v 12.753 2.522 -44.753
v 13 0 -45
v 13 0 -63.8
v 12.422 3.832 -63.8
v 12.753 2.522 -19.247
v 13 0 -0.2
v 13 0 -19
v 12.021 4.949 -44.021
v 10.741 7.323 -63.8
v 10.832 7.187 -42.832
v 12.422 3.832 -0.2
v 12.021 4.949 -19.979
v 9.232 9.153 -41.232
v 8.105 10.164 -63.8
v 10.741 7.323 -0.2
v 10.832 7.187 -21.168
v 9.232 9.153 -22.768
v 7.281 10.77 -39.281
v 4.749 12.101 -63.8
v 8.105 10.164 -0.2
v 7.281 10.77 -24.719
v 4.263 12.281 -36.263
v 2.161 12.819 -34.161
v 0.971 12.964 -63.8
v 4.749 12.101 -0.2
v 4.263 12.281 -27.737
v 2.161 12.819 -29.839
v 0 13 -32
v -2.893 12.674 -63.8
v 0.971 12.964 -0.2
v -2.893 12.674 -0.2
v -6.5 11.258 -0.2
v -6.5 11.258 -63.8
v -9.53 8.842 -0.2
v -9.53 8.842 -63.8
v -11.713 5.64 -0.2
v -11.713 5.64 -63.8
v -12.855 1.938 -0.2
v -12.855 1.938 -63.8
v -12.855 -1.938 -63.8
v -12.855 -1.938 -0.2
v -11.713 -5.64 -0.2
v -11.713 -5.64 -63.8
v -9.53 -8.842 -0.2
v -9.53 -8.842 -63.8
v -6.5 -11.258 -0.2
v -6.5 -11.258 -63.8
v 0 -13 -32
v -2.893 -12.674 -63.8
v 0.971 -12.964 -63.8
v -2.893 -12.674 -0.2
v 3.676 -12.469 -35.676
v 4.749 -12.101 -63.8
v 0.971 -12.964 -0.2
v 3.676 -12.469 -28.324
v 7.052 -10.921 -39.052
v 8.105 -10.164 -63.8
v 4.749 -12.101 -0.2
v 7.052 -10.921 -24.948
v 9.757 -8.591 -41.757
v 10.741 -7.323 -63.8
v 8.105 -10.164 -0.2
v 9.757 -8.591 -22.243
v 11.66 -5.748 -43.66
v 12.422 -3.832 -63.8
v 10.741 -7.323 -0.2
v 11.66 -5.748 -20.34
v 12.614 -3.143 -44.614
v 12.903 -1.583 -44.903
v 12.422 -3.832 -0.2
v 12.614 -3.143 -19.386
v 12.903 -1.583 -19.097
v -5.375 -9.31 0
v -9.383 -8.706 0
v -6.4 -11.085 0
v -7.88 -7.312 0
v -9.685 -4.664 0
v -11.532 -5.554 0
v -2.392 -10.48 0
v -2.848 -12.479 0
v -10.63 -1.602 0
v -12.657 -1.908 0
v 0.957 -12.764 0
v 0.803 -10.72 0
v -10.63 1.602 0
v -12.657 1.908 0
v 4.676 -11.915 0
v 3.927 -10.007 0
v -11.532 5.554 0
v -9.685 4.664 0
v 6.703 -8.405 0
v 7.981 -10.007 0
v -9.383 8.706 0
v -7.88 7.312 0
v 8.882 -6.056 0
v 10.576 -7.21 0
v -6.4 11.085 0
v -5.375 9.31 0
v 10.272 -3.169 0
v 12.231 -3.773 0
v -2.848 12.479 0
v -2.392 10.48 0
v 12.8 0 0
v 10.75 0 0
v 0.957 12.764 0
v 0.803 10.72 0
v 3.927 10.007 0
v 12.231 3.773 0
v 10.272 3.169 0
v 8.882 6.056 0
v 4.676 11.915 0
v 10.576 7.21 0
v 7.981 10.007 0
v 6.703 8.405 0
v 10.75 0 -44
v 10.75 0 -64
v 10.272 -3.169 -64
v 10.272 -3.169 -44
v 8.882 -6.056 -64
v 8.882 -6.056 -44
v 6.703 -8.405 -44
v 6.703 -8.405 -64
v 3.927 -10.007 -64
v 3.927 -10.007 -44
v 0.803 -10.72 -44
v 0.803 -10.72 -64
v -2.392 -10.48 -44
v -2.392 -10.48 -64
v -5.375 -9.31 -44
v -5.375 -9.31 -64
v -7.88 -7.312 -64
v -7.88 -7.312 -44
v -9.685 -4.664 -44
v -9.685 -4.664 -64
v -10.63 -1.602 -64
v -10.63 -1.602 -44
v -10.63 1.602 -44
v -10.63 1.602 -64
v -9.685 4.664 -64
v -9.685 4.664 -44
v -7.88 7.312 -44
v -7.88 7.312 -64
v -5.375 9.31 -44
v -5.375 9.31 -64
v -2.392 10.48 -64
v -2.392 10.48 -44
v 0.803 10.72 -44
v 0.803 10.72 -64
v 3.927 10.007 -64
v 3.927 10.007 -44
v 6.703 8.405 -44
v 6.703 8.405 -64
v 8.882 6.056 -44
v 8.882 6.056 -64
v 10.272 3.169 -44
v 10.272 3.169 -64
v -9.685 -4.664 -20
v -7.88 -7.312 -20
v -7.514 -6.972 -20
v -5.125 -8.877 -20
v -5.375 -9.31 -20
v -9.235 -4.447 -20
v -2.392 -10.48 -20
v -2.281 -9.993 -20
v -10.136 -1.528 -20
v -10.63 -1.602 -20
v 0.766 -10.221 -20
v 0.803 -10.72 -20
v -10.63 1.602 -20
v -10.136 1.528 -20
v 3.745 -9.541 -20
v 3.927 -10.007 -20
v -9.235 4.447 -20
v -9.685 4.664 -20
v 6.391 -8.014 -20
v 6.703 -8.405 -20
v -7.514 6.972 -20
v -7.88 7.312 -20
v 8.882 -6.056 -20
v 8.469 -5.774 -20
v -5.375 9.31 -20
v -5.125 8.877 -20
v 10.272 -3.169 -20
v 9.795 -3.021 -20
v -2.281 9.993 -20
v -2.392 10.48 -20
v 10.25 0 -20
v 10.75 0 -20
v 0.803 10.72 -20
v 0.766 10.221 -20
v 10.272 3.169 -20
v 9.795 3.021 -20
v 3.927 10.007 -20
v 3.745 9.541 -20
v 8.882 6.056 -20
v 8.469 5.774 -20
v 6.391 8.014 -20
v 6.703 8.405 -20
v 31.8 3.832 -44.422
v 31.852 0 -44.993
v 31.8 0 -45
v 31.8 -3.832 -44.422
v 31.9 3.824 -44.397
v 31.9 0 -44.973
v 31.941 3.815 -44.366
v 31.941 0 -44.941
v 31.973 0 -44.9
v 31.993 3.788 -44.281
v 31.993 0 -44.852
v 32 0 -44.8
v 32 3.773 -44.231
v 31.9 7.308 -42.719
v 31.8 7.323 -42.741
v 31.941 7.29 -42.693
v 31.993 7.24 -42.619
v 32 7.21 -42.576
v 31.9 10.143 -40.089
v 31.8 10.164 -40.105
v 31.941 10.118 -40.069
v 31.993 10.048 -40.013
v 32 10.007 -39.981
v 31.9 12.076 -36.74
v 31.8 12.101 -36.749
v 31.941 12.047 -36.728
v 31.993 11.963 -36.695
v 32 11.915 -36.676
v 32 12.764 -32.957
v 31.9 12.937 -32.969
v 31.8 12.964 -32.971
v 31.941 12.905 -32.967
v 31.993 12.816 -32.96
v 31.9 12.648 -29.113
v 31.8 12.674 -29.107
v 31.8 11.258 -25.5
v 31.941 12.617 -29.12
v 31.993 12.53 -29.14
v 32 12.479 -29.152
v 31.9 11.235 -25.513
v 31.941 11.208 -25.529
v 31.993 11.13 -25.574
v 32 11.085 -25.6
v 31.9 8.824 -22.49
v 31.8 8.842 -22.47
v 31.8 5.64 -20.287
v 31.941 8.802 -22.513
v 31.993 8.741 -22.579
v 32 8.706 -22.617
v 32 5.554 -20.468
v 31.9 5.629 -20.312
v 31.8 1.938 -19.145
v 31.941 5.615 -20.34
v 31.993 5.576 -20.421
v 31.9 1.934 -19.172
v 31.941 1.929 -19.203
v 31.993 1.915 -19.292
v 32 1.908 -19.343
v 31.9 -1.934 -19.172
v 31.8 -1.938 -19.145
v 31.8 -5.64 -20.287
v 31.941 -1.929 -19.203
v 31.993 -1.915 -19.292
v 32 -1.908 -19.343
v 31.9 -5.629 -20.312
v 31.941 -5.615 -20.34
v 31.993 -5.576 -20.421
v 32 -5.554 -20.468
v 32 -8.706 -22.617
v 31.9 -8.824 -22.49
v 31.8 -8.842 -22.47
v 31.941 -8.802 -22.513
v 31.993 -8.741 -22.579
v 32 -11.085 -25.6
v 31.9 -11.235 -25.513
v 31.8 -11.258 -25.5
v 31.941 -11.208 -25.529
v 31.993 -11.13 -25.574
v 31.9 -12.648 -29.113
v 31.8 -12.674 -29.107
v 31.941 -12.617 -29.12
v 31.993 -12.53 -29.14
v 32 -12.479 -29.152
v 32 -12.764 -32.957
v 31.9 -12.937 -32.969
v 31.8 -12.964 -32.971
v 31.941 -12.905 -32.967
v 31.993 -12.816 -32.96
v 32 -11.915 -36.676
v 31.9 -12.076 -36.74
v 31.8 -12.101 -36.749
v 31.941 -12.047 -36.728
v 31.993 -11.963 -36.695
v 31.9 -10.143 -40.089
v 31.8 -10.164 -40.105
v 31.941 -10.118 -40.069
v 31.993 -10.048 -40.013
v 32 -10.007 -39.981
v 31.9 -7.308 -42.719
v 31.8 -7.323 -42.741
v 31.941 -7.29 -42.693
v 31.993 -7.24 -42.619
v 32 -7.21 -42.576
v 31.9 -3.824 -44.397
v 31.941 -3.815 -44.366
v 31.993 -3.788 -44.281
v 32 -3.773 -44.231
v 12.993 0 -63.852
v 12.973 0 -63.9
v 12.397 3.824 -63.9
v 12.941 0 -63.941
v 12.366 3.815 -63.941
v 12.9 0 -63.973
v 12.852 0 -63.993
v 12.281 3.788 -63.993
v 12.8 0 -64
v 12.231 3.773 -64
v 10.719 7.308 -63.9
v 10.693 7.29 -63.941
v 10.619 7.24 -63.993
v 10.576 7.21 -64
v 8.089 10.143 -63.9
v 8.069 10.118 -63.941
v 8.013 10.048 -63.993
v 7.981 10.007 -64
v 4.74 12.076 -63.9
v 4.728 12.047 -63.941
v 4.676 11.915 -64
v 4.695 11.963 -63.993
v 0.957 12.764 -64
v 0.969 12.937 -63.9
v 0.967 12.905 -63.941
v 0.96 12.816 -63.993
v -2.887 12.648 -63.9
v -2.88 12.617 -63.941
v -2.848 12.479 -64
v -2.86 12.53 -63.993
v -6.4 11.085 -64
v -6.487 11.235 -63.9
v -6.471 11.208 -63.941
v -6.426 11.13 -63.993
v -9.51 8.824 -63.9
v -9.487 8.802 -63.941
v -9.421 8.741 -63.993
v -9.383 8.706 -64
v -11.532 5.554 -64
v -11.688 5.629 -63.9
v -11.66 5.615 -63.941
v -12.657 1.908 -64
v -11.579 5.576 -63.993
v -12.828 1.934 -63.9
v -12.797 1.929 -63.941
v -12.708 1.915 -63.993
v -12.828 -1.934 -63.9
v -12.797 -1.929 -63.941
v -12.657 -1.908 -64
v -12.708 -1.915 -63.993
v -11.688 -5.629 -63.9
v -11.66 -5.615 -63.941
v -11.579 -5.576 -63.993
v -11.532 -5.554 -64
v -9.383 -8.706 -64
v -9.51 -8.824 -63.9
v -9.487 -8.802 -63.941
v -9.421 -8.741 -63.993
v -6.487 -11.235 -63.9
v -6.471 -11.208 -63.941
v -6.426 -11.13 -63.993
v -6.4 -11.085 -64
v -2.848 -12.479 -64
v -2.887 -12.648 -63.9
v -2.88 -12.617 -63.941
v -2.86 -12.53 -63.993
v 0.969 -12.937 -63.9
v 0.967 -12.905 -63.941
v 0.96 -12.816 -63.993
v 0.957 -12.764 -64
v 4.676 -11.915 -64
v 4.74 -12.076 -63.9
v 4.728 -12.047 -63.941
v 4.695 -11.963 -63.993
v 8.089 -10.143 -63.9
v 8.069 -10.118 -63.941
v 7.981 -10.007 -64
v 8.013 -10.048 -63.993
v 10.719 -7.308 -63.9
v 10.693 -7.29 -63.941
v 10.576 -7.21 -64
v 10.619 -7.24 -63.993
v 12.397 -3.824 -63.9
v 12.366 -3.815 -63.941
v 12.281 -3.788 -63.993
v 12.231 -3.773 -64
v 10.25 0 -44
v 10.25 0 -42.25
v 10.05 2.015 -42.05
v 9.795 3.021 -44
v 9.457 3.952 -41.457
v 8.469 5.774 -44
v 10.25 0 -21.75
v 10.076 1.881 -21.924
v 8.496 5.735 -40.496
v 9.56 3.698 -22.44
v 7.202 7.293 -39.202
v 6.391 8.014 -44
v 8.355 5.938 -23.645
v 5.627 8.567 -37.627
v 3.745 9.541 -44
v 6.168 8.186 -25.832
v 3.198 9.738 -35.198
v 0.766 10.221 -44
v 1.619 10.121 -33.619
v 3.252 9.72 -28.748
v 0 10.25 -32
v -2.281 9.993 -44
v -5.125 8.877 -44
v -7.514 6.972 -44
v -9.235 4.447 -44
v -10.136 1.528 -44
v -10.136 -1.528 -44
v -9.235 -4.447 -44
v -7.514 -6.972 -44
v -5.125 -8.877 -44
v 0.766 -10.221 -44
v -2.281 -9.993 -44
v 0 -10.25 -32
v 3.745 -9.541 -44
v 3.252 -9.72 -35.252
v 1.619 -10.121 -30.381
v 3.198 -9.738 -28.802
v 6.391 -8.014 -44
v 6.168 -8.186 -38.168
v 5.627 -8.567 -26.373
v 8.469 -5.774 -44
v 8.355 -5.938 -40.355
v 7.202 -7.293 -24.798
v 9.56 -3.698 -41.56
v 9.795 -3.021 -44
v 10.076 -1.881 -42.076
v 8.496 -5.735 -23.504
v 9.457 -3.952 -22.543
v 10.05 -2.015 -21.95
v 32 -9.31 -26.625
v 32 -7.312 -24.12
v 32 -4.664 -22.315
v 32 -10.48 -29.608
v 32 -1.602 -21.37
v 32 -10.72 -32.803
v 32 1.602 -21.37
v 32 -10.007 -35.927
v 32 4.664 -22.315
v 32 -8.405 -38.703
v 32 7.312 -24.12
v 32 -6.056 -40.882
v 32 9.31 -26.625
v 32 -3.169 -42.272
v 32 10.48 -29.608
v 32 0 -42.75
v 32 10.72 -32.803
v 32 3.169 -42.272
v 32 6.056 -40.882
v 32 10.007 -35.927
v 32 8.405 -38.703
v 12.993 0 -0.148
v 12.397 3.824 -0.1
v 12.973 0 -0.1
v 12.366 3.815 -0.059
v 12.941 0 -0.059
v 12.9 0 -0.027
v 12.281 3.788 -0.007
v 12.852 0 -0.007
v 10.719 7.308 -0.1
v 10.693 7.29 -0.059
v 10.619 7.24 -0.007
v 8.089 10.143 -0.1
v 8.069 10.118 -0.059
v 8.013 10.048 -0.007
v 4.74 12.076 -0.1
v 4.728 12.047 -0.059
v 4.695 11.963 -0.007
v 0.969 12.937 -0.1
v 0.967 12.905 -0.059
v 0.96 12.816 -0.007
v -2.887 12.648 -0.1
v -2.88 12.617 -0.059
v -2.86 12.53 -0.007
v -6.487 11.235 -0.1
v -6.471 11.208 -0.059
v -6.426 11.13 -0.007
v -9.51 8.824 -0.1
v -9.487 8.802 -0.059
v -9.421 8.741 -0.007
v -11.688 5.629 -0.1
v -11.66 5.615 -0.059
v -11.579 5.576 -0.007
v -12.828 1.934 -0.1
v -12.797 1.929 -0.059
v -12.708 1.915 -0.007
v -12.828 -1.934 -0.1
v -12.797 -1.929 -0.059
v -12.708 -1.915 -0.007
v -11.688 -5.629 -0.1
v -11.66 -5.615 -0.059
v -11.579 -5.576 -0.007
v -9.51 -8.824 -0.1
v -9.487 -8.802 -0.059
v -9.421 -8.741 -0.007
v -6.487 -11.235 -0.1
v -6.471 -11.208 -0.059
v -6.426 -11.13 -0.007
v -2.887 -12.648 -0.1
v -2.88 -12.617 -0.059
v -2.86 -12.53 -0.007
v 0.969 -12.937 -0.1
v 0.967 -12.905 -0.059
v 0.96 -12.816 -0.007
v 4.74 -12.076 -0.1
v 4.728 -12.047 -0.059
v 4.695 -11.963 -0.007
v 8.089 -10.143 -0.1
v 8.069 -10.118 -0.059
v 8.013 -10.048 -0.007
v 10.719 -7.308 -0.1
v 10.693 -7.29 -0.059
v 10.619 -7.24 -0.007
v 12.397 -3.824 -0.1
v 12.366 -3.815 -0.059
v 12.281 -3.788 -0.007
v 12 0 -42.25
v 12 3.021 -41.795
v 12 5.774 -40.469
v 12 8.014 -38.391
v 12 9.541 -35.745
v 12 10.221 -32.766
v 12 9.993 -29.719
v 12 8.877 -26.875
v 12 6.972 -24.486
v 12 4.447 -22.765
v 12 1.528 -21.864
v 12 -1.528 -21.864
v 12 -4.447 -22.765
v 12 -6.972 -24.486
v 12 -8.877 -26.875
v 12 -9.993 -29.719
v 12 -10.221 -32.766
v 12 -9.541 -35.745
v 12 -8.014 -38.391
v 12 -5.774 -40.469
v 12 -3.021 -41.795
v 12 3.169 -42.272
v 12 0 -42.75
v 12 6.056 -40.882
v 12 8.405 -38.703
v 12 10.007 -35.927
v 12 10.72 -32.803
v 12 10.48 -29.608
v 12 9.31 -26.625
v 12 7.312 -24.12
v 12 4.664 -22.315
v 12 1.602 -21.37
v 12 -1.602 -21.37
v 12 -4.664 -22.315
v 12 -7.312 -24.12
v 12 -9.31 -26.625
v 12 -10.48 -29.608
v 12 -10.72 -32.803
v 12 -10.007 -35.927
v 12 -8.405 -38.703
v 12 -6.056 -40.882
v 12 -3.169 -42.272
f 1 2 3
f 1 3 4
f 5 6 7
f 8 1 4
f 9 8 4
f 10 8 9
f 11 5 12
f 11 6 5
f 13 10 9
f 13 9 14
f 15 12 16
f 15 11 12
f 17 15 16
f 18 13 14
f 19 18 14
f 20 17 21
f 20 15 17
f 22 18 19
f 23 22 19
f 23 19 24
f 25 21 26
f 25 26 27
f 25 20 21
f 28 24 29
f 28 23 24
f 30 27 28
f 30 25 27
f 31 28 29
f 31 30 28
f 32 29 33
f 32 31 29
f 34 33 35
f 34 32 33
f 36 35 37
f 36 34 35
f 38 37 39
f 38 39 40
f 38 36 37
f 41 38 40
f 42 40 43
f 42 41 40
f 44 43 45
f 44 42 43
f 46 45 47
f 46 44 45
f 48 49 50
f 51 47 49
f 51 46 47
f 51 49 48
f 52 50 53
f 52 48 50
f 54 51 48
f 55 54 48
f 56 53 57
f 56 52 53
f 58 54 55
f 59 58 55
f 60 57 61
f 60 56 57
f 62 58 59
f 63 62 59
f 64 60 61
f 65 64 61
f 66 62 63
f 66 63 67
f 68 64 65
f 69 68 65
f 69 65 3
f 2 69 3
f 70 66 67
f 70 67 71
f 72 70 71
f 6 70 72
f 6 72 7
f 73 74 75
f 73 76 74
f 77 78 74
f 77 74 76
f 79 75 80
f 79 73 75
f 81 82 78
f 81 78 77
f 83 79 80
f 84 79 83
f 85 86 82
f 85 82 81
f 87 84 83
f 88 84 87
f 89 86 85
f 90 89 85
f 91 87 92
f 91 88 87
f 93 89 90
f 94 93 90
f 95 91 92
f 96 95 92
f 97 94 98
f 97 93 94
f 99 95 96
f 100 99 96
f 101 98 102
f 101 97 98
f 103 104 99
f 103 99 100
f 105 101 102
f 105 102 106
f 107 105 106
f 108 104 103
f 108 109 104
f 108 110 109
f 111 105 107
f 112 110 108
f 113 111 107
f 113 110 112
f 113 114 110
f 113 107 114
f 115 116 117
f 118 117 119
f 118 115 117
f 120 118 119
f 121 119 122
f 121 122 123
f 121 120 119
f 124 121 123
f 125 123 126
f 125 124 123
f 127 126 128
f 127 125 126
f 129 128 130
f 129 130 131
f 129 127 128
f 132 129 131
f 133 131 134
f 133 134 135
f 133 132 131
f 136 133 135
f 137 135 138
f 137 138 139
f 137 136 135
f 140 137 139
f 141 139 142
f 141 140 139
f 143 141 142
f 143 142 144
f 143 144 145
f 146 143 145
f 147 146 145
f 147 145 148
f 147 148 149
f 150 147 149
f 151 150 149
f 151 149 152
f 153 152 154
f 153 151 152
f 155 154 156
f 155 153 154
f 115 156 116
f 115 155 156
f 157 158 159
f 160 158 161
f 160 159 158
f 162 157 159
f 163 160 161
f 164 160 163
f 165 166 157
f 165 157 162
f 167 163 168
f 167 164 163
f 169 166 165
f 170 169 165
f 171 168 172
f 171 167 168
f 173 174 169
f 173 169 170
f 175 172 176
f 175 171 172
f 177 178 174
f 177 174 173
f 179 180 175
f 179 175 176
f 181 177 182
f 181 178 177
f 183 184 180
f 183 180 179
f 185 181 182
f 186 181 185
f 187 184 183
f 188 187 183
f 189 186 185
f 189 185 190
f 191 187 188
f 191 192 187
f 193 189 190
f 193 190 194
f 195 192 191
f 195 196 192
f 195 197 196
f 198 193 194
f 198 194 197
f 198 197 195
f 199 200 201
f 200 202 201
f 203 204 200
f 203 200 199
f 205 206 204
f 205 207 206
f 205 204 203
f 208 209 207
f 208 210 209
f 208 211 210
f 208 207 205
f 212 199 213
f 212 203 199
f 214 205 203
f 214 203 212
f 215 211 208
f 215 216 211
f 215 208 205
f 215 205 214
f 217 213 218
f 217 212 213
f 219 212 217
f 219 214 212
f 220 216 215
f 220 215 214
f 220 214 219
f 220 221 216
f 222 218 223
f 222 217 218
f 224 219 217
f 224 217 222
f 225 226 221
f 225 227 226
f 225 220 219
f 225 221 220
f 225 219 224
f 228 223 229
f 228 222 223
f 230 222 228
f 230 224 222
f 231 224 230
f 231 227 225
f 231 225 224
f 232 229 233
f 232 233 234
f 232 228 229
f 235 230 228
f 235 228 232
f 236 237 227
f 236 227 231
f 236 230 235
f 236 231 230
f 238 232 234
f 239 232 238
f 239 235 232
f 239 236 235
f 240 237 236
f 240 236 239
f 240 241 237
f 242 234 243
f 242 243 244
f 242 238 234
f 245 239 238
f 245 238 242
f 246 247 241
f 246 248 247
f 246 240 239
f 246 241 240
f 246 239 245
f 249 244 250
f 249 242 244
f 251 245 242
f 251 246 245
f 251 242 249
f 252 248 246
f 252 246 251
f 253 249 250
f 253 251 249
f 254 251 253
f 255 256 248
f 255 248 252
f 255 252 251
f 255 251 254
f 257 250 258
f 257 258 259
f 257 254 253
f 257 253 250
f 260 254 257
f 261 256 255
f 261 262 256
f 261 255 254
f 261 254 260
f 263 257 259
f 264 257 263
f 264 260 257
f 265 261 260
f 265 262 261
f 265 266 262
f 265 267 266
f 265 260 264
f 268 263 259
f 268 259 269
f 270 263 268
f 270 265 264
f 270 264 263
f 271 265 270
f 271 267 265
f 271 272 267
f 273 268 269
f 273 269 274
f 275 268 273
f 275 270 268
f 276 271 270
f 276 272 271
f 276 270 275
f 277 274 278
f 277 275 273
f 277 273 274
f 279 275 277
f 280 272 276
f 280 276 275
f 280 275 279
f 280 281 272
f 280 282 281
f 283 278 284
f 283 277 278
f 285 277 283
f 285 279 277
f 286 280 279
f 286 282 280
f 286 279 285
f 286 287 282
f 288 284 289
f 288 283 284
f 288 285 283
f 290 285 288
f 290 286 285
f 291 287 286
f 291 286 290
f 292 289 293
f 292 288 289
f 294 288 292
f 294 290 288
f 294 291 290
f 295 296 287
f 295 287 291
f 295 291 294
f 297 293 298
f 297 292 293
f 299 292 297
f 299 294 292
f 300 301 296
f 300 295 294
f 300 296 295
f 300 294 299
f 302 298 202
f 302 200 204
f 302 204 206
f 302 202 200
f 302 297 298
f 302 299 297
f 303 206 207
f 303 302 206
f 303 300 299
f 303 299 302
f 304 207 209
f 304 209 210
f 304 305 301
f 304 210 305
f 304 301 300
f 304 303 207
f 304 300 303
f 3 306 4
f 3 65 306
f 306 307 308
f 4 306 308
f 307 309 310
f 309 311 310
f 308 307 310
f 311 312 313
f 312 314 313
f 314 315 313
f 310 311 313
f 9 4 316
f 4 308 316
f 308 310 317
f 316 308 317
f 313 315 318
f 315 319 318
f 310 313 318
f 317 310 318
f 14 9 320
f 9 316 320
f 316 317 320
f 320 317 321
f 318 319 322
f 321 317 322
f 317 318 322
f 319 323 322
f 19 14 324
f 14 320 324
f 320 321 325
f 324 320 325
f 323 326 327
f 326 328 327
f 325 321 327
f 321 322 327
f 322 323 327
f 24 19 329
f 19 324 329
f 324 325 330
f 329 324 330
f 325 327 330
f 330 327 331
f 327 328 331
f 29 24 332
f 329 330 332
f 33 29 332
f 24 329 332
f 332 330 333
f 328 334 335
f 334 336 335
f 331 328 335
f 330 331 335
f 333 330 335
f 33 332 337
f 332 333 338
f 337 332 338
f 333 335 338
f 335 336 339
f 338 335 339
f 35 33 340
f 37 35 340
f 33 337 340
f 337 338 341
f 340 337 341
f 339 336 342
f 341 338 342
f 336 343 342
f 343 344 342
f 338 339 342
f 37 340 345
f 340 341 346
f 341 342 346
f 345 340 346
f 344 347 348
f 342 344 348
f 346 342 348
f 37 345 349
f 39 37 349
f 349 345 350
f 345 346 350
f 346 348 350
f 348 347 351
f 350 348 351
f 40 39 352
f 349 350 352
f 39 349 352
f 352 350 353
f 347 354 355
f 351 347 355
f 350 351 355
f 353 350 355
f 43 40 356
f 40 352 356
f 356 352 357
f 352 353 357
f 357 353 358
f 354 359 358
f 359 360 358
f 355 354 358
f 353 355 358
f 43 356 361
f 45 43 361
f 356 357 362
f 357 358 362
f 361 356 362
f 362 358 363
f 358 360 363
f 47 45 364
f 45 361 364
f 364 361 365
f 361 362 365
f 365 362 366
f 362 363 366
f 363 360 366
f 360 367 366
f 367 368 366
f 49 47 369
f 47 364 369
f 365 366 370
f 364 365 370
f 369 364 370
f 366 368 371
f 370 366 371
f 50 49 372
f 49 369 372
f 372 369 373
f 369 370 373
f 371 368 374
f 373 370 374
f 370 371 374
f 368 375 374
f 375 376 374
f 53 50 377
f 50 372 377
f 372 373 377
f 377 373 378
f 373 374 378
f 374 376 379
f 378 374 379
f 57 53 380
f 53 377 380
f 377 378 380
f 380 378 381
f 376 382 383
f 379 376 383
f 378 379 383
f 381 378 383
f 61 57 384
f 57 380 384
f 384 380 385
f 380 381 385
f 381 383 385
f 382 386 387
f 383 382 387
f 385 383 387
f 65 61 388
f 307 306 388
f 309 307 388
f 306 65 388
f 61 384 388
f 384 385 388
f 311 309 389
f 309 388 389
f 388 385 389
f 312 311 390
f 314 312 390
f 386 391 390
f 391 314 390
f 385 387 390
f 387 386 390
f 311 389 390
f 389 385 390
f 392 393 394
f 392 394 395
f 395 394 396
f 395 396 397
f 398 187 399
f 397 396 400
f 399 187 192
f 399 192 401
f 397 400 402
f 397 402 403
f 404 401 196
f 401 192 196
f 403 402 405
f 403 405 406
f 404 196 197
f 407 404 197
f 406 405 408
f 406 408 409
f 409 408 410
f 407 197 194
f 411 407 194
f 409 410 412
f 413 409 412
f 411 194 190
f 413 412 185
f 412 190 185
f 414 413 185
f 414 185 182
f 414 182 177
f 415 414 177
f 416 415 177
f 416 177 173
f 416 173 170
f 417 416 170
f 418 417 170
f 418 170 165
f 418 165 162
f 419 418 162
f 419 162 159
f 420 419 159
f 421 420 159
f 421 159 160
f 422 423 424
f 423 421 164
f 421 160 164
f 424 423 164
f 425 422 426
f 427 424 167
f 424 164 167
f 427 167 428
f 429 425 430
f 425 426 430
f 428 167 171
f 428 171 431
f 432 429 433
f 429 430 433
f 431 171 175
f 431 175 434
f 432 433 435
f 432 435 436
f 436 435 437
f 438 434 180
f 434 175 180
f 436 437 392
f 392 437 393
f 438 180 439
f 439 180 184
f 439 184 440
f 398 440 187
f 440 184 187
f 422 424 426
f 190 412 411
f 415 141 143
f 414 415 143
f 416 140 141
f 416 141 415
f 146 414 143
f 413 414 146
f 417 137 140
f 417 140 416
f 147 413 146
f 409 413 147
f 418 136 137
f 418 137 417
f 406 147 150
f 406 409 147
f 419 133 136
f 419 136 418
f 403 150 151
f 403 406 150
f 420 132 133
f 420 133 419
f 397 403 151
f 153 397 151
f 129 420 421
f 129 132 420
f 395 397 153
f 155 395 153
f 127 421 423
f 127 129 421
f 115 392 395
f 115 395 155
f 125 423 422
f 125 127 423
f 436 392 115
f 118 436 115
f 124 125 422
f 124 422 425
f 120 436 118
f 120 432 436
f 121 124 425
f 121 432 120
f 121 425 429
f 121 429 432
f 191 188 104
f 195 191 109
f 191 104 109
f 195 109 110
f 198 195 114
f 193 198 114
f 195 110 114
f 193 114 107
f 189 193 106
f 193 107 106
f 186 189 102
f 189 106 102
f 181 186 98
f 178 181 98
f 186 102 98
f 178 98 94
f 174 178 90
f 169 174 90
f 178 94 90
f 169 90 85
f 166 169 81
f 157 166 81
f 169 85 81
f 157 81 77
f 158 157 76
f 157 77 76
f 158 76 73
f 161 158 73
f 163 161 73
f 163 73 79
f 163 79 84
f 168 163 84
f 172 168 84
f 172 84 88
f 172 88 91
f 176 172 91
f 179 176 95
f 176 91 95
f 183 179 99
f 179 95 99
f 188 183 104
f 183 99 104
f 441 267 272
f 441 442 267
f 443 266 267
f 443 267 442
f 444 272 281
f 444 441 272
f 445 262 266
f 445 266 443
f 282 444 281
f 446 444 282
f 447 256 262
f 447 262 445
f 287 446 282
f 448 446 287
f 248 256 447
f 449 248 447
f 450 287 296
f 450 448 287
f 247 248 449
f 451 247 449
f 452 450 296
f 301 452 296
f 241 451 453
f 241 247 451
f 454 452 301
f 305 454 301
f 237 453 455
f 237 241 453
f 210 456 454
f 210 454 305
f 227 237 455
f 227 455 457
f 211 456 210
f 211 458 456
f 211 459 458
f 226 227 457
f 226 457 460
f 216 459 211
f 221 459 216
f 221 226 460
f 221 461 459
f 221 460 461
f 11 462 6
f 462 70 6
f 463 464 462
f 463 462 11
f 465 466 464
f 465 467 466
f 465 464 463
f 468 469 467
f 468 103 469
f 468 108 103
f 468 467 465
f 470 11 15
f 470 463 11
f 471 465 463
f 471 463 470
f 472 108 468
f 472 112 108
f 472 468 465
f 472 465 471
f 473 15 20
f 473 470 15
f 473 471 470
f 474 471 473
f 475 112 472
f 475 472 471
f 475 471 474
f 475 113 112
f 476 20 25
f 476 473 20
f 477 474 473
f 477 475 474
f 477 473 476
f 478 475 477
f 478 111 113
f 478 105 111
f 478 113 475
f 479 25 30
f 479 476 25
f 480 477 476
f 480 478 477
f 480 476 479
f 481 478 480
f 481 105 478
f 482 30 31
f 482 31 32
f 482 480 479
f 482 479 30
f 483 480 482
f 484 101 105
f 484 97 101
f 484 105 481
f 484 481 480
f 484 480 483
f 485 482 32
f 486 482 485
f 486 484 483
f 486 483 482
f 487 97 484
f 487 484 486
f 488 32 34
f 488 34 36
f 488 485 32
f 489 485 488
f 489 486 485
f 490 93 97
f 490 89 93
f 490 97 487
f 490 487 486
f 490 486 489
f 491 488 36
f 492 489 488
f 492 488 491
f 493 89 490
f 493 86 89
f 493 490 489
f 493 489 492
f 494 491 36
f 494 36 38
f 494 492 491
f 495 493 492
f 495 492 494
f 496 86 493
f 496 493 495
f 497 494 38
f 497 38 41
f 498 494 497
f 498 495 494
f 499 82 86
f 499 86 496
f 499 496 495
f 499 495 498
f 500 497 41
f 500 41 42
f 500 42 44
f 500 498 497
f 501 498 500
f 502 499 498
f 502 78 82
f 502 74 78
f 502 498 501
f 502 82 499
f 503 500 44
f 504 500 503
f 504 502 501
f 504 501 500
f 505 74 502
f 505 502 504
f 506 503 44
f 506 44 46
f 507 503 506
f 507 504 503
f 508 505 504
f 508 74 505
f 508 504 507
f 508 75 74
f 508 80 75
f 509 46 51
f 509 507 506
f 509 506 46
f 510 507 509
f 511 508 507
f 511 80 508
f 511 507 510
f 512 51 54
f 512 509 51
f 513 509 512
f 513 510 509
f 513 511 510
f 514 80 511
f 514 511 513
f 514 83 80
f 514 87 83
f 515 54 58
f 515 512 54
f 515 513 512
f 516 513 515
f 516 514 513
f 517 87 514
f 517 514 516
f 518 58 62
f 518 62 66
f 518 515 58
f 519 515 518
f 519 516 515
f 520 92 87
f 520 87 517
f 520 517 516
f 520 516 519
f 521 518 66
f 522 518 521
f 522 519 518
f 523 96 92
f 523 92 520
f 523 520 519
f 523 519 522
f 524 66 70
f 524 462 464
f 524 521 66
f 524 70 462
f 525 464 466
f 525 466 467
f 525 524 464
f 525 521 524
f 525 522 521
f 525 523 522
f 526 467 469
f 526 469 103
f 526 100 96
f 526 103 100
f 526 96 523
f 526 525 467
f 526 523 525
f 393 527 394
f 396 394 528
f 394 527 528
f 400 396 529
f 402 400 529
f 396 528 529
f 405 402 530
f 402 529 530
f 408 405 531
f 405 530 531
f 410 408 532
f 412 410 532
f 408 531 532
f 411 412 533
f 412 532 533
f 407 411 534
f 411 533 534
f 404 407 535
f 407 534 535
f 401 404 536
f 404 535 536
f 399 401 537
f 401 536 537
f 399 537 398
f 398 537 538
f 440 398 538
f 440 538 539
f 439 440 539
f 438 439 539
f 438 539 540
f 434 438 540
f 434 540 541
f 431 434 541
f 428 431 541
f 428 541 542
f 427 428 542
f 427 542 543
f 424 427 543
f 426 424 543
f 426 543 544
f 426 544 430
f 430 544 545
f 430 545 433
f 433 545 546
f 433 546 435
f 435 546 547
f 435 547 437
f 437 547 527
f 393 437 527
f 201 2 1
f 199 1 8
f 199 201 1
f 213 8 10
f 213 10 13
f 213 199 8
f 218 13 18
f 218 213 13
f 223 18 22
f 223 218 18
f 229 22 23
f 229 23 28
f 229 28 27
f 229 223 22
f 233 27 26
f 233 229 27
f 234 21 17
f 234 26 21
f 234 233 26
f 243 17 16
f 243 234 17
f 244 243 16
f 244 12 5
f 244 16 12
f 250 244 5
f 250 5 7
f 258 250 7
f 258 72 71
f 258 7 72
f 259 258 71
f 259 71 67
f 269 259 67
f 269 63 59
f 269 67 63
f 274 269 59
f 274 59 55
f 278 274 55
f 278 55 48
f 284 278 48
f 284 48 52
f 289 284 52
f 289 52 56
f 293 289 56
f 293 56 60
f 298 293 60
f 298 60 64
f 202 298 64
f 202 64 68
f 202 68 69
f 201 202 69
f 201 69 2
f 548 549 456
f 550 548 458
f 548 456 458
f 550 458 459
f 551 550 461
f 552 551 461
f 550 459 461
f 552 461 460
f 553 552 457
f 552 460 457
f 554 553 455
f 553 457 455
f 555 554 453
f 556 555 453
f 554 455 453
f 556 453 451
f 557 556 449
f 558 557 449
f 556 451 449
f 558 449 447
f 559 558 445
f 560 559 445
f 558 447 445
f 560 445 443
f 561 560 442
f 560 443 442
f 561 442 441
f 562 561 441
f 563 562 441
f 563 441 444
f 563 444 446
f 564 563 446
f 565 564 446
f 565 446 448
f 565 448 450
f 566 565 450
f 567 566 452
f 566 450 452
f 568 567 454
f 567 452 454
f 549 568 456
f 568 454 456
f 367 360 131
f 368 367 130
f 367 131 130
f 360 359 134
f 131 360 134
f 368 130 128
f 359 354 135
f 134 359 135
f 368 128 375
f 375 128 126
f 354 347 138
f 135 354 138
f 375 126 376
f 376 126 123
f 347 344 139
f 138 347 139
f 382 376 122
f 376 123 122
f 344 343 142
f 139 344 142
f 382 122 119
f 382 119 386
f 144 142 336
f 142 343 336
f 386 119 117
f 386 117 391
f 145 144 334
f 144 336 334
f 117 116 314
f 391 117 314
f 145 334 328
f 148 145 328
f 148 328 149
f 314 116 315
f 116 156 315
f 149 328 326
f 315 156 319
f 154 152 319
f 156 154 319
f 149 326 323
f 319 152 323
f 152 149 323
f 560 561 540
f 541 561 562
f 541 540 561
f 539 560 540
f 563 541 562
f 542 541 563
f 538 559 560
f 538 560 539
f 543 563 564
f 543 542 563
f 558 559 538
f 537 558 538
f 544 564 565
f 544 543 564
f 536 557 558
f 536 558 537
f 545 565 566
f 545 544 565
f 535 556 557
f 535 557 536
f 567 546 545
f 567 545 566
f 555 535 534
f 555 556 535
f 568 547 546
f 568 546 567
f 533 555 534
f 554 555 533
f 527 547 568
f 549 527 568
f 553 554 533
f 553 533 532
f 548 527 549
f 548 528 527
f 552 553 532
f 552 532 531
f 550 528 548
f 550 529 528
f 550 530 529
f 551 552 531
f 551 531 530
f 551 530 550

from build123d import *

# Parameters (mm, degrees)
SKETCH2_R           = 13
SKETCH2_R_2         = 10.25
BOSS_EXTRUDE1_DEPTH = 64
SKETCH3_R           = 13
BOSS_EXTRUDE2_DEPTH = 32
SKETCH4_R           = 10.25
CUT_EXTRUDE1_DEPTH  = 32
SKETCH5_R           = 10.25
CUT_EXTRUDE2_DEPTH  = 78
SKETCH6_R           = 10.75
CUT_EXTRUDE3_DEPTH  = 20
CUT_EXTRUDE4_START  = -20
SKETCH7_R           = 10.75
CUT_EXTRUDE4_DEPTH  = 20
SKETCH8_R           = 10.75
CUT_EXTRUDE5_DEPTH  = 20
FILLET1_R           = 0.2


with BuildPart() as part:
    # Sketch2 → Boss-Extrude1 (new body)
    with BuildSketch(Plane.XY):
        Circle(SKETCH2_R)
        Circle(SKETCH2_R_2, mode=Mode.SUBTRACT)
    extrude(amount=-BOSS_EXTRUDE1_DEPTH)

    # Sketch3 → Boss-Extrude2 (add)
    with BuildSketch(Plane(origin=(32, 0, 0), x_dir=(0, 0, -1), z_dir=(1, 0, 0))):
        with Locations((32, 0)):
            Circle(SKETCH3_R)
    extrude(amount=-BOSS_EXTRUDE2_DEPTH)

    # Sketch4 → Cut-Extrude1 (cut)
    with BuildSketch(Plane(origin=(32, 0, 0), x_dir=(0, 0, -1), z_dir=(1, 0, 0))):
        with Locations((32, 0)):
            Circle(SKETCH4_R)
    extrude(amount=-CUT_EXTRUDE1_DEPTH, mode=Mode.SUBTRACT)

    # Sketch5 → Cut-Extrude2 (cut)
    with BuildSketch(Plane.XY):
        Circle(SKETCH5_R)
    extrude(amount=-CUT_EXTRUDE2_DEPTH, mode=Mode.SUBTRACT)

    # Sketch6 → Cut-Extrude3 (cut)
    with BuildSketch(Plane.XY):
        Circle(SKETCH6_R)
    extrude(amount=-CUT_EXTRUDE3_DEPTH, mode=Mode.SUBTRACT)

    # Sketch7 → Cut-Extrude4 (cut)
    with BuildSketch(Plane(origin=(0, 0, -64), x_dir=(-1, 0, 0), z_dir=(0, 0, -1)).offset(CUT_EXTRUDE4_START)):
        with Locations(Location((0, 0, 0), (0, 0, 180))):
            Circle(SKETCH7_R)
    extrude(amount=CUT_EXTRUDE4_DEPTH, mode=Mode.SUBTRACT)

    # Sketch8 → Cut-Extrude5 (cut)
    with BuildSketch(Plane(origin=(32, 0, 0), x_dir=(0, 0, -1), z_dir=(1, 0, 0))):
        with Locations((32, 0)):
            Circle(SKETCH8_R)
    extrude(amount=-CUT_EXTRUDE5_DEPTH, mode=Mode.SUBTRACT)

    # Fillet1
    fillet1_edges = [part.edges().sort_by_distance(p)[0] for p in [
        (32, 0, -19),
        (-13, 0, 0),
        (-13, 0, -64),
    ]]
    fillet(fillet1_edges, radius=FILLET1_R)


solid = part.part
